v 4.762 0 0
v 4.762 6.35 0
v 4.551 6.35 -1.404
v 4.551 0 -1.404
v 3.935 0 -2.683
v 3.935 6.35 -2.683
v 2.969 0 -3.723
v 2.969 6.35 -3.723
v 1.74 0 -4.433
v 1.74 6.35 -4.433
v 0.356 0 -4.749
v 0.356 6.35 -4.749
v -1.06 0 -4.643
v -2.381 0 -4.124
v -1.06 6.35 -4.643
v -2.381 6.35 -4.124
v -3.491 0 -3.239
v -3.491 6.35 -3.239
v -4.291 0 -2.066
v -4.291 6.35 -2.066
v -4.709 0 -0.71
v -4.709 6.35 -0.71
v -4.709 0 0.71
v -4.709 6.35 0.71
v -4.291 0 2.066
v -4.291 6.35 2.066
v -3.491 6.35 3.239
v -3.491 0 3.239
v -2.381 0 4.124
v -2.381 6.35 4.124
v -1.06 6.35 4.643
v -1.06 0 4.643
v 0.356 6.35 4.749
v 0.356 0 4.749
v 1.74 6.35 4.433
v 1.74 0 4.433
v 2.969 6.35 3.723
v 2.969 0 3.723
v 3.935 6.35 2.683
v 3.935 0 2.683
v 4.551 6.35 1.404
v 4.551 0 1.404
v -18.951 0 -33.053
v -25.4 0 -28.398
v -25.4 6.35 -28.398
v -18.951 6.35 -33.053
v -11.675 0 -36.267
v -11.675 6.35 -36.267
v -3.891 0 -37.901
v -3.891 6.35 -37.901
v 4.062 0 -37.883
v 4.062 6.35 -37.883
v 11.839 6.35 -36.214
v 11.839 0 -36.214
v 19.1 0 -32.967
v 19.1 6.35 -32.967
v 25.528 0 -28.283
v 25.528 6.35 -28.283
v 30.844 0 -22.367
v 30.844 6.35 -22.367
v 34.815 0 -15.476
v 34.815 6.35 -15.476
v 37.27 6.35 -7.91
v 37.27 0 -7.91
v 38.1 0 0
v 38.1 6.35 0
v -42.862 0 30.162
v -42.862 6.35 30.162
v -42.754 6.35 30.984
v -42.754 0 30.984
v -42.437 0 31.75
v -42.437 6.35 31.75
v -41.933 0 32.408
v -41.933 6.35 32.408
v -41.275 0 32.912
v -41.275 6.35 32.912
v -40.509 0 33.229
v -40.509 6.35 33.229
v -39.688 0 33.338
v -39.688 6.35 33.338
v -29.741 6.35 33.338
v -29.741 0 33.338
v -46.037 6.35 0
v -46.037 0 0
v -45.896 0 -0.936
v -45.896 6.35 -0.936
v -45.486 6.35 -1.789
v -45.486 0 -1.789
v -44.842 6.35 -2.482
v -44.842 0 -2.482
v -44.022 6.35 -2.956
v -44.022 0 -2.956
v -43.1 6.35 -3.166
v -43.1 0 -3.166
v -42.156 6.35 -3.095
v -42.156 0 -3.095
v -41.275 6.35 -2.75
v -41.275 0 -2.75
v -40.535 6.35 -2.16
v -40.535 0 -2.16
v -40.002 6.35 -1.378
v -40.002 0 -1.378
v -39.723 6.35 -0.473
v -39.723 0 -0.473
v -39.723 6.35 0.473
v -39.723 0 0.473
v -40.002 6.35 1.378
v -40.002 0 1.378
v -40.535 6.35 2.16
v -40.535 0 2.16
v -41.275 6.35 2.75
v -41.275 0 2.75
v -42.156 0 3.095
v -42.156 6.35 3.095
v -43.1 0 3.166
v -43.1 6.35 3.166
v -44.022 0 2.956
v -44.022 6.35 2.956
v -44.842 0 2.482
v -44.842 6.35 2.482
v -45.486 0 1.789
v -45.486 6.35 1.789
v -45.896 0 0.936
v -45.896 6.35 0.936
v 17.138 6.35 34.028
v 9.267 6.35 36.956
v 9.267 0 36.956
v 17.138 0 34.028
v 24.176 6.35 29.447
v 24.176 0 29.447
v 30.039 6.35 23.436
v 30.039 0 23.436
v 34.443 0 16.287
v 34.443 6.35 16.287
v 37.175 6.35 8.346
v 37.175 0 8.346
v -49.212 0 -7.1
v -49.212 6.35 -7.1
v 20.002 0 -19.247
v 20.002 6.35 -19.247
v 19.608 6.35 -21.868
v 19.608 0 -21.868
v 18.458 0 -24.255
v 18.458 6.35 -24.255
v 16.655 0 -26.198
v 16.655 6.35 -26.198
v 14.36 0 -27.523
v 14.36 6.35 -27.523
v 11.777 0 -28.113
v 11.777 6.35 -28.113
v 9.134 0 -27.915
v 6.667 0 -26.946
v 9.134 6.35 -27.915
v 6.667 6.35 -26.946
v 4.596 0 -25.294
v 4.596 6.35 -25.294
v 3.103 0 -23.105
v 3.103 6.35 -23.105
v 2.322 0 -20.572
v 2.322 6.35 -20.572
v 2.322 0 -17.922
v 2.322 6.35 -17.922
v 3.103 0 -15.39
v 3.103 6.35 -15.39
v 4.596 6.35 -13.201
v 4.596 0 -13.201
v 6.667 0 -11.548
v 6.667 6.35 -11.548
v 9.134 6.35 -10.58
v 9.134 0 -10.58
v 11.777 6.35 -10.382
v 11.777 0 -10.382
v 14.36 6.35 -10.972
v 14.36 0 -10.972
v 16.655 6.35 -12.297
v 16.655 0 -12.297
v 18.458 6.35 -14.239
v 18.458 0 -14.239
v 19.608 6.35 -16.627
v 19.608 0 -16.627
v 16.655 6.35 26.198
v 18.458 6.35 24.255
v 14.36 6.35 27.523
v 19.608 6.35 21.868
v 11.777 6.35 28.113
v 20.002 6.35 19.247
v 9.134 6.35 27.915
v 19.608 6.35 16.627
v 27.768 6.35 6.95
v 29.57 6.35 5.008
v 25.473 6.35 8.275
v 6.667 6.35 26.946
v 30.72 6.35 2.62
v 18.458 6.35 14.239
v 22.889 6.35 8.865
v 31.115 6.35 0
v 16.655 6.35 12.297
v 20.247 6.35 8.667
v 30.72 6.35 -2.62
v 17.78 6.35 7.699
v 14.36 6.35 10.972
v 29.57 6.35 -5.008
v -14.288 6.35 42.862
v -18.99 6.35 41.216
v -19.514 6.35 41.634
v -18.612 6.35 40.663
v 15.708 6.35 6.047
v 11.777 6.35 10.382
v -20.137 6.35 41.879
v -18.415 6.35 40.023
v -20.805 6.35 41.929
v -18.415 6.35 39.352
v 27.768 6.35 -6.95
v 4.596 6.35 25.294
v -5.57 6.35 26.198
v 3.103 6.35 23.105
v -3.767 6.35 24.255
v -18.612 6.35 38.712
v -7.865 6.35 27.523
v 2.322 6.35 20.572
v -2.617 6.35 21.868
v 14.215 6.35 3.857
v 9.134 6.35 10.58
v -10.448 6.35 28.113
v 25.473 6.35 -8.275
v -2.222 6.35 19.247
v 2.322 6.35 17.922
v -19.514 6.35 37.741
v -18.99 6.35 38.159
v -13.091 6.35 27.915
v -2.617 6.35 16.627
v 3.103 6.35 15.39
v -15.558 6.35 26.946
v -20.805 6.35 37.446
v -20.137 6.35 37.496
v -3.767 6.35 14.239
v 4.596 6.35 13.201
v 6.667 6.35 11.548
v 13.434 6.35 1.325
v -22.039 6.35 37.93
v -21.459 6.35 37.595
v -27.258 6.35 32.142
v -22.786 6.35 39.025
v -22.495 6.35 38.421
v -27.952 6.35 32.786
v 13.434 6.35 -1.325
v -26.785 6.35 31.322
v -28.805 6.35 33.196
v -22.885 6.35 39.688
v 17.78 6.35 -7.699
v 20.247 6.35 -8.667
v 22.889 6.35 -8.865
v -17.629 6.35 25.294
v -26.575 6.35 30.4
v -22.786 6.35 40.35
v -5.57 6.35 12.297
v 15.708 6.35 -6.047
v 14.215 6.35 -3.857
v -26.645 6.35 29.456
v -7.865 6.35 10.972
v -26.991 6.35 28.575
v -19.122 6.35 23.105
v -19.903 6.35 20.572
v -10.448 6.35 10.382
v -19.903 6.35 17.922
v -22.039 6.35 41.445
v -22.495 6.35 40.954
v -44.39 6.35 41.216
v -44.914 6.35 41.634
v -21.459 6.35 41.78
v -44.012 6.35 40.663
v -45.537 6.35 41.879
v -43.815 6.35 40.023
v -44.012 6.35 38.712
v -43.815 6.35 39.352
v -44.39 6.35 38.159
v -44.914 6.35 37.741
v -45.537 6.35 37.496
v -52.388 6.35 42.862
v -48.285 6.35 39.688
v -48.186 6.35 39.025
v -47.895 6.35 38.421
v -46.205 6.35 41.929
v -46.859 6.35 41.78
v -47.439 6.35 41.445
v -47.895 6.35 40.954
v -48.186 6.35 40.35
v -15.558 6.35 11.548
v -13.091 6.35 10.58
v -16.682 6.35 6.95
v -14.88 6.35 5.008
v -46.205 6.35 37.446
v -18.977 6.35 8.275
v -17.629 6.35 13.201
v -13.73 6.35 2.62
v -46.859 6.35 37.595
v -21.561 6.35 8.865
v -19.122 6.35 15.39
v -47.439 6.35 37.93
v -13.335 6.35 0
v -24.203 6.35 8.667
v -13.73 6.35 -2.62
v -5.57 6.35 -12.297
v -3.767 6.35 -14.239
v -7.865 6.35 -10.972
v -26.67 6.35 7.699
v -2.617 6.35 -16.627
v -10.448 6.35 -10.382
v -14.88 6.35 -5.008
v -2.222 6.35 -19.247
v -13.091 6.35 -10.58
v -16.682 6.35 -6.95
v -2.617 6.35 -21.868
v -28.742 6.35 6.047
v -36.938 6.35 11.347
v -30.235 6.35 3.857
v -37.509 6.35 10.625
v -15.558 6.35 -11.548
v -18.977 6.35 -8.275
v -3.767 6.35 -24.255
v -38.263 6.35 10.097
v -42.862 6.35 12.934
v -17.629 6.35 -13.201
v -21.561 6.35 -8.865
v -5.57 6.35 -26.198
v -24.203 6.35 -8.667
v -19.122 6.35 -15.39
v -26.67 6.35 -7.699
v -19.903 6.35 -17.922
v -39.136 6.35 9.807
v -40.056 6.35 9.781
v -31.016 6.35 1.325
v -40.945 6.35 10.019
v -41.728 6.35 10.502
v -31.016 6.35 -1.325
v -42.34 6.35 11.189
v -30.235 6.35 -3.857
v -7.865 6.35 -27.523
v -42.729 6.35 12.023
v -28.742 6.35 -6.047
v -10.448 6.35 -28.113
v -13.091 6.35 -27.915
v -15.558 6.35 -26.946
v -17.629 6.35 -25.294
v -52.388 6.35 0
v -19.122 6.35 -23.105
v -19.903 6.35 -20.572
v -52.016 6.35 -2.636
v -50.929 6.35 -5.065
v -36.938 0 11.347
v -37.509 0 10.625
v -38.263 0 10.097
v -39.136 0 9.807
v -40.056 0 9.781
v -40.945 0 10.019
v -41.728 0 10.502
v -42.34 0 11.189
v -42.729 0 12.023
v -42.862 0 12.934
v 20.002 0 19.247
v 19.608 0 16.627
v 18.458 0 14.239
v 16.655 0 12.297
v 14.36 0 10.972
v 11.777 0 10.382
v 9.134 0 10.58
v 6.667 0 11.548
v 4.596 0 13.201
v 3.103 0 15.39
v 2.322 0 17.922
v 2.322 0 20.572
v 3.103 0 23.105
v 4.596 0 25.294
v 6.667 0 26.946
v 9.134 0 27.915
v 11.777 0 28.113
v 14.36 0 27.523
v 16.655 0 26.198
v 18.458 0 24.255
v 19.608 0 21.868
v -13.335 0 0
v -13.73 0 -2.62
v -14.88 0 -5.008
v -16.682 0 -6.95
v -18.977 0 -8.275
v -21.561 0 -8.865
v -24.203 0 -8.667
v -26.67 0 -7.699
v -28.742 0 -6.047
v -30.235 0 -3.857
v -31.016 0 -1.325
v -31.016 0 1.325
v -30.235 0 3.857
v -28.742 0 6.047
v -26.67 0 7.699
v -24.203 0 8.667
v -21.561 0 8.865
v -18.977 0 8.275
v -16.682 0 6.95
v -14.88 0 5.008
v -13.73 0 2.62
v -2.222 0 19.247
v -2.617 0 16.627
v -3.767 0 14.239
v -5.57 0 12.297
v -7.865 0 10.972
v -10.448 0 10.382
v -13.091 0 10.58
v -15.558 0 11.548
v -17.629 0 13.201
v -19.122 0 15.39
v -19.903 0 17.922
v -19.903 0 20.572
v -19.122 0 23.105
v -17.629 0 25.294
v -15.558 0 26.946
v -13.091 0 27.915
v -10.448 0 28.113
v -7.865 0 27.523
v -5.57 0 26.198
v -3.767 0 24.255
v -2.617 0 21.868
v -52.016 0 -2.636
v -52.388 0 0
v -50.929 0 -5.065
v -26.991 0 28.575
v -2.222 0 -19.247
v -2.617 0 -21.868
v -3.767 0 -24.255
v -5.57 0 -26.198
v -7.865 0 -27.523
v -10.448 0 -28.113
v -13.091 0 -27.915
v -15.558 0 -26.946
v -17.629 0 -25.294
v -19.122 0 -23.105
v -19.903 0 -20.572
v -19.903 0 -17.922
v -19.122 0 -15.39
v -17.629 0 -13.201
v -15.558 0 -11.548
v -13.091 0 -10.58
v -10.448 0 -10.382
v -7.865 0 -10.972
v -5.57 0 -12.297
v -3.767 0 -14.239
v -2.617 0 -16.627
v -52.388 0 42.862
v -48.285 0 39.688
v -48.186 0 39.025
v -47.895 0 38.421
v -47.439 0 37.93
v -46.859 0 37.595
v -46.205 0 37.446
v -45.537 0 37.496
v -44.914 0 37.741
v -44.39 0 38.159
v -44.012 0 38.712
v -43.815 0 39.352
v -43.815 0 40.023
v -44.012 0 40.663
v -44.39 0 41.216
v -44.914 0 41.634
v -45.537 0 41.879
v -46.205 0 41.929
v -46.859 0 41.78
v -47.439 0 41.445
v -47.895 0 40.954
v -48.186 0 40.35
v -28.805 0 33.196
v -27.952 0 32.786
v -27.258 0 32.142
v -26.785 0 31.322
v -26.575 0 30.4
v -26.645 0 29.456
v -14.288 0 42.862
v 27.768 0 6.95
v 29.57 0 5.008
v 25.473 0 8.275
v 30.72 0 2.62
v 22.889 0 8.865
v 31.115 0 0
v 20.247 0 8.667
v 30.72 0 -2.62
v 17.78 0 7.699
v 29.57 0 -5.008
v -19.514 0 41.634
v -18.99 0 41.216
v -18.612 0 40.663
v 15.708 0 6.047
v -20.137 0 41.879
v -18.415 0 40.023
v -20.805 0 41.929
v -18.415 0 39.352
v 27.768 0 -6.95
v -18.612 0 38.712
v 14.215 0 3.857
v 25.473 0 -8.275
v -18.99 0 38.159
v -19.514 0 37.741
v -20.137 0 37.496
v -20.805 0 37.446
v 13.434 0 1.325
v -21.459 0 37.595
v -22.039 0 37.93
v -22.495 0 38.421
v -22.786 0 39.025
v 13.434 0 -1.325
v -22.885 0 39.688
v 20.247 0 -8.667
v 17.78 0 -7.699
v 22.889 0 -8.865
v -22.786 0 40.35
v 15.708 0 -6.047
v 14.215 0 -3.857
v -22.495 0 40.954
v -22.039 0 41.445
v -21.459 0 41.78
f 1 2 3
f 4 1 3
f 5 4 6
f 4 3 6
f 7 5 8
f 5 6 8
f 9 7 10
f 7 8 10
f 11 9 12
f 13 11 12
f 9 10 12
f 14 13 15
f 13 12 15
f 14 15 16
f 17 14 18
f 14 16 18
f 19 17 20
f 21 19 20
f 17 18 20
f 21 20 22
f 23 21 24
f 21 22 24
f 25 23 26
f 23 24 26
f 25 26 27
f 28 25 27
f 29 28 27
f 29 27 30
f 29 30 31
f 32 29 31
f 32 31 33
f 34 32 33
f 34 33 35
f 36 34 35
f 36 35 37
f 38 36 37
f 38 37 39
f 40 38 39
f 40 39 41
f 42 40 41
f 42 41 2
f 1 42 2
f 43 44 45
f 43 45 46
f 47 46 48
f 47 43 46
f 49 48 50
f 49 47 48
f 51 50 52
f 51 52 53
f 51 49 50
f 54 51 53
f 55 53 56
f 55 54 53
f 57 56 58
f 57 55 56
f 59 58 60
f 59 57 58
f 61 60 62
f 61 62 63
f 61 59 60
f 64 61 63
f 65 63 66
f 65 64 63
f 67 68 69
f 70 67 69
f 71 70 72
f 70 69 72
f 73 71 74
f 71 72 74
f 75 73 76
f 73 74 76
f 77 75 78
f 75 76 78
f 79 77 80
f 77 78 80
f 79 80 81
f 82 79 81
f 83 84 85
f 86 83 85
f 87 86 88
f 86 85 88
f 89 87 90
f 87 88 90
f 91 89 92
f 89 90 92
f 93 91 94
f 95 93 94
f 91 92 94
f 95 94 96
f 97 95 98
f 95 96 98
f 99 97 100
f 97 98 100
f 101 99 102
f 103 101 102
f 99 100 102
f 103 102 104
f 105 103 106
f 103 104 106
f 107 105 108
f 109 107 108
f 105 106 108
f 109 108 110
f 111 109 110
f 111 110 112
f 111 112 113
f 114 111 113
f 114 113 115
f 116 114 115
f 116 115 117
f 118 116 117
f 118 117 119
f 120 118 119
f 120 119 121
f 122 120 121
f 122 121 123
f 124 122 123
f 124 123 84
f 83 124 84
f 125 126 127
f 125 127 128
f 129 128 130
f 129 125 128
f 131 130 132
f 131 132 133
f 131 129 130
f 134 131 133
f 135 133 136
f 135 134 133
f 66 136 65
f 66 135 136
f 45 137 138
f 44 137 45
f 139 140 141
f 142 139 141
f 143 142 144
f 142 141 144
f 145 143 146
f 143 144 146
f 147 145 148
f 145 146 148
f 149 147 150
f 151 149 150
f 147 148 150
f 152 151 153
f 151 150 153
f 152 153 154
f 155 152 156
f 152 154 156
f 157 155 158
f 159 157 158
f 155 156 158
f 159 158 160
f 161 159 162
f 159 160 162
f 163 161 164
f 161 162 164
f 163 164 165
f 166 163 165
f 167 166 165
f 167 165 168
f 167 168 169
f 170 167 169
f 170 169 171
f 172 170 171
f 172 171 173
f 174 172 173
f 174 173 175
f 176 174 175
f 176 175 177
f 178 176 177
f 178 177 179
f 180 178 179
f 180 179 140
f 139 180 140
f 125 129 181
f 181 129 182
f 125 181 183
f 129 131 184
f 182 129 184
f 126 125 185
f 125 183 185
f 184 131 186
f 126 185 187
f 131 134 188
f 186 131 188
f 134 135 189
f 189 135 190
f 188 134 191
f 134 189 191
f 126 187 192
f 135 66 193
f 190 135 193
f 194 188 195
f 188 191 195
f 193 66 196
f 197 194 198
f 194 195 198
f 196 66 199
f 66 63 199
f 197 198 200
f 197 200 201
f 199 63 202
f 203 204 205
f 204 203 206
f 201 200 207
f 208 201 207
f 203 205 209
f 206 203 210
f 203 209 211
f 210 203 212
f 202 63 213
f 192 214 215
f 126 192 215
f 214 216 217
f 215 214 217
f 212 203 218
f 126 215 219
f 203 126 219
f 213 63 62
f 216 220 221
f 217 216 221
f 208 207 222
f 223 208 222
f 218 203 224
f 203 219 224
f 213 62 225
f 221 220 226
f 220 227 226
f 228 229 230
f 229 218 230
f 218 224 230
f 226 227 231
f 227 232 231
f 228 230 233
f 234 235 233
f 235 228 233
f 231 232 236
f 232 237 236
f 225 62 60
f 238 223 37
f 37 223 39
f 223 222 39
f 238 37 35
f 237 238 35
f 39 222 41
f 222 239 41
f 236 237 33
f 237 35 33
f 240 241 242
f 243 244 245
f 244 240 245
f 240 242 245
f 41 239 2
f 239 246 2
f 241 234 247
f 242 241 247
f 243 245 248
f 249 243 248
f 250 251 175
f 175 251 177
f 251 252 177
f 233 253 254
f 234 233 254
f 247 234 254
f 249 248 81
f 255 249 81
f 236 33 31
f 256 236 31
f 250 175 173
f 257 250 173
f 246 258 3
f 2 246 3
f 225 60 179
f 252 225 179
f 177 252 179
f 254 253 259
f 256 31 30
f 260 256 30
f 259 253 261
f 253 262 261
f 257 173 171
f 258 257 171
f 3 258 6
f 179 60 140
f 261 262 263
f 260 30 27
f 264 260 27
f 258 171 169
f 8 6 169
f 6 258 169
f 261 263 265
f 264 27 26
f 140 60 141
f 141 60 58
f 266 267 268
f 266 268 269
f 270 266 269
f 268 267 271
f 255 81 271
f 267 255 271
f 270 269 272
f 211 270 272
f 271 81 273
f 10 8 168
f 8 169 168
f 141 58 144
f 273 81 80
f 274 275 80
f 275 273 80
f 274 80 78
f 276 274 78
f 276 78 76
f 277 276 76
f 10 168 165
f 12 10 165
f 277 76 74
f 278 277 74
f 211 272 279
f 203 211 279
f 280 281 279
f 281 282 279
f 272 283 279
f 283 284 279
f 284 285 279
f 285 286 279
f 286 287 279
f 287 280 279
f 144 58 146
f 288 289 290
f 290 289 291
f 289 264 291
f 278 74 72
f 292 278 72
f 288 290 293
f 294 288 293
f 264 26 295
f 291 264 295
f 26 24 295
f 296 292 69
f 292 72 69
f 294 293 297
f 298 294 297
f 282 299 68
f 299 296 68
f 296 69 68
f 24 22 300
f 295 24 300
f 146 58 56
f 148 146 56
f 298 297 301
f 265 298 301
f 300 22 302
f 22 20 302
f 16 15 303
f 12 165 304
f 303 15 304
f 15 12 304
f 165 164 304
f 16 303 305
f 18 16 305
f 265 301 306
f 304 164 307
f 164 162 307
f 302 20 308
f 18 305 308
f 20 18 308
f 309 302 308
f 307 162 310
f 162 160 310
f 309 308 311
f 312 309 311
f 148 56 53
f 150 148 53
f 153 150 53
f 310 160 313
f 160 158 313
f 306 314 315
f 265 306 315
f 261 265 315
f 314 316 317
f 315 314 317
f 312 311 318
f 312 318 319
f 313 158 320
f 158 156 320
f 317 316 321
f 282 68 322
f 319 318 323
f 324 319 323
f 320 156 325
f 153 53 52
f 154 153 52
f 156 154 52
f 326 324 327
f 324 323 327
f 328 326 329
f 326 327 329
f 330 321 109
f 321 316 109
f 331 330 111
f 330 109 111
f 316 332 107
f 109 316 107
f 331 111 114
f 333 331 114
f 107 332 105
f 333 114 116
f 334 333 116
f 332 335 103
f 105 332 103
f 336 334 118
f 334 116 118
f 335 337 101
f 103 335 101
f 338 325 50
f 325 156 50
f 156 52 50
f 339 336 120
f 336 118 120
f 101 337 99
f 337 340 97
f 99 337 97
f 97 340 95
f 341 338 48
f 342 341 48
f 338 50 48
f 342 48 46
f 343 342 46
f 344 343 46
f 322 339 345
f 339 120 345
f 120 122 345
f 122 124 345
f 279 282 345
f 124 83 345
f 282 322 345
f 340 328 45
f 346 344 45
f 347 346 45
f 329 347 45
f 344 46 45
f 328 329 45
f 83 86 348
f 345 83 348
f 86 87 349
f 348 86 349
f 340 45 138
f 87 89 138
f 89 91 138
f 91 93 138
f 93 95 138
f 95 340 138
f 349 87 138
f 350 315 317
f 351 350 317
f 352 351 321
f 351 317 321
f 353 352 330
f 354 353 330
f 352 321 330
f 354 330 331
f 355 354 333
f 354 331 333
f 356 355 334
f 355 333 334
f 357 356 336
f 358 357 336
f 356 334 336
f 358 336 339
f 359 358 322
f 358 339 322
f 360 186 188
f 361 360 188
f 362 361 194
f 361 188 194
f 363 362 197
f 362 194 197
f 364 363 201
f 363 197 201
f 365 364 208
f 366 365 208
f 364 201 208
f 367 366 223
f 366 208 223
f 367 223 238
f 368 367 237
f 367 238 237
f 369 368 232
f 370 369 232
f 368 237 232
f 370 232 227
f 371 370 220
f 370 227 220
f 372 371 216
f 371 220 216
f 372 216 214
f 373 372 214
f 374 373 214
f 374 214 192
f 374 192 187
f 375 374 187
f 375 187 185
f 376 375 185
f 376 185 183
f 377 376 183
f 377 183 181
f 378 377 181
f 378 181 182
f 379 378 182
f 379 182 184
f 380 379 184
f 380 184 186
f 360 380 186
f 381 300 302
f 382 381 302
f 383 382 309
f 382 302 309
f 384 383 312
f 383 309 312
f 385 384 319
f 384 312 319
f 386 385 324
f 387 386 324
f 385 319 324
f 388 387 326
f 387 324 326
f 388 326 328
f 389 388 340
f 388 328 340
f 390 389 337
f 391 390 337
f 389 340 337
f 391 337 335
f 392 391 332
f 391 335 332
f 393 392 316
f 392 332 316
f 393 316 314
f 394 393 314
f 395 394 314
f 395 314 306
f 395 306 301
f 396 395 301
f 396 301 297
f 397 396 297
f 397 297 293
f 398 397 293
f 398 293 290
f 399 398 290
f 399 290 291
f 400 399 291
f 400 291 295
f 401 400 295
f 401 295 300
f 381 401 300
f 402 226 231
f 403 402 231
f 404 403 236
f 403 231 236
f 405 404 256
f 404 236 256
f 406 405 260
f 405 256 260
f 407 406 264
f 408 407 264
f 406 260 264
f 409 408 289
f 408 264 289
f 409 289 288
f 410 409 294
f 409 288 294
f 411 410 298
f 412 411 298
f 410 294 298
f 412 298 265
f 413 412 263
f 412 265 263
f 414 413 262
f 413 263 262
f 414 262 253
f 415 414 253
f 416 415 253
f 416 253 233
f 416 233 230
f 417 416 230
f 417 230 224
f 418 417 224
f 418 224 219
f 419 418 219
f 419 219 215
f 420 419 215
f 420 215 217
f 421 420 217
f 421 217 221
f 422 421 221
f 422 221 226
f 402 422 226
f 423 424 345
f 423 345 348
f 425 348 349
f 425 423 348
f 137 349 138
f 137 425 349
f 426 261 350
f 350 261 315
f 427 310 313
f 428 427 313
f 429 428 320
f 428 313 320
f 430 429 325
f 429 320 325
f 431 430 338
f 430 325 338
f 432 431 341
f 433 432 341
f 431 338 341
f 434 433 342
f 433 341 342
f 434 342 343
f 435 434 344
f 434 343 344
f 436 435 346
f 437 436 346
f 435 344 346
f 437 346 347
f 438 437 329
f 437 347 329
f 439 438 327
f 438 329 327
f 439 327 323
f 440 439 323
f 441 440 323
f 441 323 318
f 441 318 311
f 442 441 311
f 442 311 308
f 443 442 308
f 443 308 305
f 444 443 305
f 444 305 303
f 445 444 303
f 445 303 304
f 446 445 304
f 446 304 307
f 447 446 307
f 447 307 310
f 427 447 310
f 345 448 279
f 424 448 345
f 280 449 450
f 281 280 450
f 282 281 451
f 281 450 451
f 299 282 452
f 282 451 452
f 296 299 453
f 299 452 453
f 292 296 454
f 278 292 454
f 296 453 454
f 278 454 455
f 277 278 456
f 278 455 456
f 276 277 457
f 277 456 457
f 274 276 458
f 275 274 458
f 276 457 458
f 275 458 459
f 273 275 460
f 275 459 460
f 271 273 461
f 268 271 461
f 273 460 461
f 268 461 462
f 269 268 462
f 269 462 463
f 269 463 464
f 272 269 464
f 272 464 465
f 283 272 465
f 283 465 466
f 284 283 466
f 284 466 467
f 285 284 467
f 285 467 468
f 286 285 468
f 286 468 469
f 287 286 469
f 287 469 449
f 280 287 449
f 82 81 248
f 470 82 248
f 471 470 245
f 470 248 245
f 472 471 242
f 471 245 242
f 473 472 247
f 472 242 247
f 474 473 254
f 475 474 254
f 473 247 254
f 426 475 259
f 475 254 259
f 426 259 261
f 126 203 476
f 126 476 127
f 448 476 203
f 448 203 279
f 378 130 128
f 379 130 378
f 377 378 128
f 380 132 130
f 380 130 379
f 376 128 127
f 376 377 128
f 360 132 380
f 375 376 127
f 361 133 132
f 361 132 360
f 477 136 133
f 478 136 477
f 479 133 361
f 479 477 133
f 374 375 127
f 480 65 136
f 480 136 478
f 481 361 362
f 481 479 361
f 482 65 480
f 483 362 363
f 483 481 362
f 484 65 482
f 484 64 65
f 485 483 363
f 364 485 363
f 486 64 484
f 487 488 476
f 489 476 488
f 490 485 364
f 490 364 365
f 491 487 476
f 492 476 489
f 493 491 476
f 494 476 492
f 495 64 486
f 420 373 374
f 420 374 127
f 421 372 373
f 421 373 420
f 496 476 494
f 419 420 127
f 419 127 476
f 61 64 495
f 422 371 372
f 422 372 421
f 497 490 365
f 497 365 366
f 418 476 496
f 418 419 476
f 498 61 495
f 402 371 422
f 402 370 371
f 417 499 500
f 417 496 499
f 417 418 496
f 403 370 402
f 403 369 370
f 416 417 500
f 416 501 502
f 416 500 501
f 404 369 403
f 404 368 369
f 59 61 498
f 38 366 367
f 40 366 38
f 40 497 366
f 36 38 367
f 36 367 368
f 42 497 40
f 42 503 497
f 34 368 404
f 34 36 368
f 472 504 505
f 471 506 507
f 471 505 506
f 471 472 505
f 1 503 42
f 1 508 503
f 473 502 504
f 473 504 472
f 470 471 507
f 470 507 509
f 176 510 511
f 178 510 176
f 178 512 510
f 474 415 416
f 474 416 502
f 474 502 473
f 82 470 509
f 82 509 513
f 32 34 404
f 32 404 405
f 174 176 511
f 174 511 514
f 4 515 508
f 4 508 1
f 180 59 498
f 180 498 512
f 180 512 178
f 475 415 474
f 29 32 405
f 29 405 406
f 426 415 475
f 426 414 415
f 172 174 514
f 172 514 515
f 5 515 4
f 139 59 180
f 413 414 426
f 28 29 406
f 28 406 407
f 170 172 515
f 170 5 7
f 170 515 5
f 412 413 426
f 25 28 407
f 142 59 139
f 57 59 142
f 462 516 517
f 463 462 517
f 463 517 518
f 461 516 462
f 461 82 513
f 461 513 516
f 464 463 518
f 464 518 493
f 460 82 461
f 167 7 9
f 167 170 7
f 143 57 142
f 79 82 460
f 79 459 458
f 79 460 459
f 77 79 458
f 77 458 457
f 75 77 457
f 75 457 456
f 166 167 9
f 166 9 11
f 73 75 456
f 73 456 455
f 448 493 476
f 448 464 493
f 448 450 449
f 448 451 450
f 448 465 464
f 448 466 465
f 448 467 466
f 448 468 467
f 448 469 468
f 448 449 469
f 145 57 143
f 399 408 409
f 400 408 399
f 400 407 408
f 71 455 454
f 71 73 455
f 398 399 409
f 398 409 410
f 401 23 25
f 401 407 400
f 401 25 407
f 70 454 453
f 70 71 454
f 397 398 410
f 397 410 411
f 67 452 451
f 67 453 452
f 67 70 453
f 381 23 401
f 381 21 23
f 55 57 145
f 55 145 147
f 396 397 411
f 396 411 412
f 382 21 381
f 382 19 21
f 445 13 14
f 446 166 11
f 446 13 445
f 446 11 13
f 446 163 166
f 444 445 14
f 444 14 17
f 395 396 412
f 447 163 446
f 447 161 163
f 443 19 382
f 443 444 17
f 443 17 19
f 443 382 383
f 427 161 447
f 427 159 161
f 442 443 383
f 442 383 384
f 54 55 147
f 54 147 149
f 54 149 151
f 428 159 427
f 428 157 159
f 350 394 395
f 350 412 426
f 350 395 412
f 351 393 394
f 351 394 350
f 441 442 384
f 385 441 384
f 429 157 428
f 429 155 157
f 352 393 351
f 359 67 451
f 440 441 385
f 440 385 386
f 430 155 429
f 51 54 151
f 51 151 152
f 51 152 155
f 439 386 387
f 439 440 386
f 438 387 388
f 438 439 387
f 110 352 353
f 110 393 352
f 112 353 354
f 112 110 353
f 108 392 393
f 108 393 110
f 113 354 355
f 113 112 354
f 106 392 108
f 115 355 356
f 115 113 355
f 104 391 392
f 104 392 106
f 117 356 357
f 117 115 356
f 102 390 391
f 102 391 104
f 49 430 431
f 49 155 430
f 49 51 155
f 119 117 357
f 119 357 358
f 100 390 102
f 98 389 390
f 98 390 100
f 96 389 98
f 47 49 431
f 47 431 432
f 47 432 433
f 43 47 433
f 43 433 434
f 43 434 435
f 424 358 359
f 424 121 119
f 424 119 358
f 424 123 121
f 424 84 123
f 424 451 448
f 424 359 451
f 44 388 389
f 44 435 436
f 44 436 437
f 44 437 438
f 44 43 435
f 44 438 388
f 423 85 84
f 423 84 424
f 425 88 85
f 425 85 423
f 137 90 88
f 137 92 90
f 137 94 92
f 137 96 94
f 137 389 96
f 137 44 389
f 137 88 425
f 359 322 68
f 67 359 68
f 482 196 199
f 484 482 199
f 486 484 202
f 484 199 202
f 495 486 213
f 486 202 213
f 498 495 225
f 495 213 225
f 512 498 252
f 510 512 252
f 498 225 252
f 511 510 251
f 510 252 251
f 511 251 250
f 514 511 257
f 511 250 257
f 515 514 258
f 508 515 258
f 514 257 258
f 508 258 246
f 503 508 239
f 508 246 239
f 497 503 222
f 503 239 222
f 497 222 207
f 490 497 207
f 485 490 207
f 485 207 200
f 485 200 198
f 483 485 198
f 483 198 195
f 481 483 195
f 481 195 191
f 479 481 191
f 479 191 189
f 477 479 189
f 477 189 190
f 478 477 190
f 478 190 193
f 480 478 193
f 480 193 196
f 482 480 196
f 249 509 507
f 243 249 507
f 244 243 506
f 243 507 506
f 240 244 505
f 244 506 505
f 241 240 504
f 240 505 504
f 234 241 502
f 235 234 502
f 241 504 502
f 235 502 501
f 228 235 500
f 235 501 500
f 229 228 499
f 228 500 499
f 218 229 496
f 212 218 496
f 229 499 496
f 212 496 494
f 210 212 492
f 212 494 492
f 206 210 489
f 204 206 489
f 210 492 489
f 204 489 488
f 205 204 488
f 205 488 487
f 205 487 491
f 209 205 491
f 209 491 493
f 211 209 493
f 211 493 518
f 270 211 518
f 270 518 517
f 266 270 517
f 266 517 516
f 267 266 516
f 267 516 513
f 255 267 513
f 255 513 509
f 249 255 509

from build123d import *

# Parameters (mm, degrees)
BOSS_EXTRUDE1_DEPTH             = 6.35
F_1_4_0_25_DIAMETER_HOLE1_D     = 6.35
F_1_4_0_25_DIAMETER_HOLE1_DEPTH = 16.51
F_1_4_0_25_DIAMETER_HOLE1_TIP   = 1.907732465
F_8_CLEARANCE_HOLE1_D           = 4.4958
F_8_CLEARANCE_HOLE1_DEPTH       = 16.51
F_8_CLEARANCE_HOLE1_TIP         = 1.350674586
SKETCH7_R                       = 4.7625
CUT_EXTRUDE1_DEPTH              = 7.35
CUT_EXTRUDE2_DEPTH              = 7.35
SKETCH9_R                       = 8.89
CUT_EXTRUDE3_DEPTH              = 7.35


with BuildPart() as part:
    # Sketch1 → Boss-Extrude1 (new body)
    with BuildSketch(Plane(origin=(0, 0, 0), x_dir=(1, 0, 0), z_dir=(0, 1, 0))):
        with BuildLine():
            Line((-52.3875, -42.8625), (-52.3875, 0))
            ThreePointArc((-52.3875, 0), (-51.5575956, 3.888564967), (-49.2125, 7.099515829))
            Line((-49.2125, 7.099515829), (-25.4, 28.398063314))
            ThreePointArc((-25.4, 28.398063314), (15.554259867, 34.780382402), (38.1, 0))
            Line((38.1, 0), (38.1, -42.8625))
            Line((38.1, -42.8625), (-52.3875, -42.8625))
        make_face()
    extrude(amount=BOSS_EXTRUDE1_DEPTH)

    # 1/4 (0.25) Diameter Hole1
    with Locations(Plane(origin=(0, 6.35, 0), x_dir=(1, 0, 0), z_dir=(0, 1, 0))):
        with Locations((-42.8625, 0)):
            Hole(F_1_4_0_25_DIAMETER_HOLE1_D / 2, depth=F_1_4_0_25_DIAMETER_HOLE1_DEPTH)
            with Locations((0, 0, -(F_1_4_0_25_DIAMETER_HOLE1_DEPTH + F_1_4_0_25_DIAMETER_HOLE1_TIP / 2))):  # 118° drill point
                Cone(0, F_1_4_0_25_DIAMETER_HOLE1_D / 2, F_1_4_0_25_DIAMETER_HOLE1_TIP, mode=Mode.SUBTRACT)

    # #8 Clearance Hole1
    with Locations(Plane(origin=(0, 6.35, 0), x_dir=(1, 0, 0), z_dir=(0, 1, 0))):
        with Locations((-46.0375, -39.6875), (-20.6375, -39.6875)):
            Hole(F_8_CLEARANCE_HOLE1_D / 2, depth=F_8_CLEARANCE_HOLE1_DEPTH)
            with Locations((0, 0, -(F_8_CLEARANCE_HOLE1_DEPTH + F_8_CLEARANCE_HOLE1_TIP / 2))):  # 118° drill point
                Cone(0, F_8_CLEARANCE_HOLE1_D / 2, F_8_CLEARANCE_HOLE1_TIP, mode=Mode.SUBTRACT)

    # Sketch7 → Cut-Extrude1 (cut, through all)
    with BuildSketch(Plane(origin=(0, 6.35, 0), x_dir=(1, 0, 0), z_dir=(0, 1, 0))):
        Circle(SKETCH7_R)
    extrude(amount=-CUT_EXTRUDE1_DEPTH, mode=Mode.SUBTRACT)

    # Sketch8 → Cut-Extrude2 (cut, through all)
    with BuildSketch(Plane(origin=(0, 6.35, 0), x_dir=(1, 0, 0), z_dir=(0, 1, 0))):
        with BuildLine():
            Line((-14.2875, -42.8625), (9.267264347, -36.955754782))
            ThreePointArc((9.267264347, -36.955754782), (30.039080975, -23.436373742), (38.1, 0))
            Line((38.1, 0), (38.1, -42.8625))
            Line((38.1, -42.8625), (-14.2875, -42.8625))
        make_face()
    extrude(amount=-CUT_EXTRUDE2_DEPTH, mode=Mode.SUBTRACT)

    # Sketch9 → Cut-Extrude3 (cut, through all)
    with BuildSketch(Plane(origin=(0, 6.35, 0), x_dir=(1, 0, 0), z_dir=(0, 1, 0))):
        with Locations((-22.225, 0)):
            Circle(SKETCH9_R)
        with Locations((-11.1125, 19.247414599)):
            Circle(SKETCH9_R)
        with Locations((11.1125, 19.247414599)):
            Circle(SKETCH9_R)
        with Locations((22.225, 0)):
            Circle(SKETCH9_R)
        with Locations((11.1125, -19.247414599)):
            Circle(SKETCH9_R)
        with Locations((-11.1125, -19.247414599)):
            Circle(SKETCH9_R)
        with BuildLine():
            Line((-42.8625, -12.934062773), (-42.8625, -30.1625))
            ThreePointArc((-42.8625, -30.1625), (-41.93256403, -32.40756403), (-39.6875, -33.3375))
            Line((-39.6875, -33.3375), (-29.740657129, -33.3375))
            ThreePointArc((-29.740657129, -33.3375), (-26.991026472, -31.75), (-26.991026472, -28.575))
            Line((-26.991026472, -28.575), (-36.937869343, -11.346562773))
            ThreePointArc((-36.937869343, -11.346562773), (-40.509250468, -9.867248274), (-42.8625, -12.934062773))
        make_face()
    extrude(amount=-CUT_EXTRUDE3_DEPTH, mode=Mode.SUBTRACT)


solid = part.part
